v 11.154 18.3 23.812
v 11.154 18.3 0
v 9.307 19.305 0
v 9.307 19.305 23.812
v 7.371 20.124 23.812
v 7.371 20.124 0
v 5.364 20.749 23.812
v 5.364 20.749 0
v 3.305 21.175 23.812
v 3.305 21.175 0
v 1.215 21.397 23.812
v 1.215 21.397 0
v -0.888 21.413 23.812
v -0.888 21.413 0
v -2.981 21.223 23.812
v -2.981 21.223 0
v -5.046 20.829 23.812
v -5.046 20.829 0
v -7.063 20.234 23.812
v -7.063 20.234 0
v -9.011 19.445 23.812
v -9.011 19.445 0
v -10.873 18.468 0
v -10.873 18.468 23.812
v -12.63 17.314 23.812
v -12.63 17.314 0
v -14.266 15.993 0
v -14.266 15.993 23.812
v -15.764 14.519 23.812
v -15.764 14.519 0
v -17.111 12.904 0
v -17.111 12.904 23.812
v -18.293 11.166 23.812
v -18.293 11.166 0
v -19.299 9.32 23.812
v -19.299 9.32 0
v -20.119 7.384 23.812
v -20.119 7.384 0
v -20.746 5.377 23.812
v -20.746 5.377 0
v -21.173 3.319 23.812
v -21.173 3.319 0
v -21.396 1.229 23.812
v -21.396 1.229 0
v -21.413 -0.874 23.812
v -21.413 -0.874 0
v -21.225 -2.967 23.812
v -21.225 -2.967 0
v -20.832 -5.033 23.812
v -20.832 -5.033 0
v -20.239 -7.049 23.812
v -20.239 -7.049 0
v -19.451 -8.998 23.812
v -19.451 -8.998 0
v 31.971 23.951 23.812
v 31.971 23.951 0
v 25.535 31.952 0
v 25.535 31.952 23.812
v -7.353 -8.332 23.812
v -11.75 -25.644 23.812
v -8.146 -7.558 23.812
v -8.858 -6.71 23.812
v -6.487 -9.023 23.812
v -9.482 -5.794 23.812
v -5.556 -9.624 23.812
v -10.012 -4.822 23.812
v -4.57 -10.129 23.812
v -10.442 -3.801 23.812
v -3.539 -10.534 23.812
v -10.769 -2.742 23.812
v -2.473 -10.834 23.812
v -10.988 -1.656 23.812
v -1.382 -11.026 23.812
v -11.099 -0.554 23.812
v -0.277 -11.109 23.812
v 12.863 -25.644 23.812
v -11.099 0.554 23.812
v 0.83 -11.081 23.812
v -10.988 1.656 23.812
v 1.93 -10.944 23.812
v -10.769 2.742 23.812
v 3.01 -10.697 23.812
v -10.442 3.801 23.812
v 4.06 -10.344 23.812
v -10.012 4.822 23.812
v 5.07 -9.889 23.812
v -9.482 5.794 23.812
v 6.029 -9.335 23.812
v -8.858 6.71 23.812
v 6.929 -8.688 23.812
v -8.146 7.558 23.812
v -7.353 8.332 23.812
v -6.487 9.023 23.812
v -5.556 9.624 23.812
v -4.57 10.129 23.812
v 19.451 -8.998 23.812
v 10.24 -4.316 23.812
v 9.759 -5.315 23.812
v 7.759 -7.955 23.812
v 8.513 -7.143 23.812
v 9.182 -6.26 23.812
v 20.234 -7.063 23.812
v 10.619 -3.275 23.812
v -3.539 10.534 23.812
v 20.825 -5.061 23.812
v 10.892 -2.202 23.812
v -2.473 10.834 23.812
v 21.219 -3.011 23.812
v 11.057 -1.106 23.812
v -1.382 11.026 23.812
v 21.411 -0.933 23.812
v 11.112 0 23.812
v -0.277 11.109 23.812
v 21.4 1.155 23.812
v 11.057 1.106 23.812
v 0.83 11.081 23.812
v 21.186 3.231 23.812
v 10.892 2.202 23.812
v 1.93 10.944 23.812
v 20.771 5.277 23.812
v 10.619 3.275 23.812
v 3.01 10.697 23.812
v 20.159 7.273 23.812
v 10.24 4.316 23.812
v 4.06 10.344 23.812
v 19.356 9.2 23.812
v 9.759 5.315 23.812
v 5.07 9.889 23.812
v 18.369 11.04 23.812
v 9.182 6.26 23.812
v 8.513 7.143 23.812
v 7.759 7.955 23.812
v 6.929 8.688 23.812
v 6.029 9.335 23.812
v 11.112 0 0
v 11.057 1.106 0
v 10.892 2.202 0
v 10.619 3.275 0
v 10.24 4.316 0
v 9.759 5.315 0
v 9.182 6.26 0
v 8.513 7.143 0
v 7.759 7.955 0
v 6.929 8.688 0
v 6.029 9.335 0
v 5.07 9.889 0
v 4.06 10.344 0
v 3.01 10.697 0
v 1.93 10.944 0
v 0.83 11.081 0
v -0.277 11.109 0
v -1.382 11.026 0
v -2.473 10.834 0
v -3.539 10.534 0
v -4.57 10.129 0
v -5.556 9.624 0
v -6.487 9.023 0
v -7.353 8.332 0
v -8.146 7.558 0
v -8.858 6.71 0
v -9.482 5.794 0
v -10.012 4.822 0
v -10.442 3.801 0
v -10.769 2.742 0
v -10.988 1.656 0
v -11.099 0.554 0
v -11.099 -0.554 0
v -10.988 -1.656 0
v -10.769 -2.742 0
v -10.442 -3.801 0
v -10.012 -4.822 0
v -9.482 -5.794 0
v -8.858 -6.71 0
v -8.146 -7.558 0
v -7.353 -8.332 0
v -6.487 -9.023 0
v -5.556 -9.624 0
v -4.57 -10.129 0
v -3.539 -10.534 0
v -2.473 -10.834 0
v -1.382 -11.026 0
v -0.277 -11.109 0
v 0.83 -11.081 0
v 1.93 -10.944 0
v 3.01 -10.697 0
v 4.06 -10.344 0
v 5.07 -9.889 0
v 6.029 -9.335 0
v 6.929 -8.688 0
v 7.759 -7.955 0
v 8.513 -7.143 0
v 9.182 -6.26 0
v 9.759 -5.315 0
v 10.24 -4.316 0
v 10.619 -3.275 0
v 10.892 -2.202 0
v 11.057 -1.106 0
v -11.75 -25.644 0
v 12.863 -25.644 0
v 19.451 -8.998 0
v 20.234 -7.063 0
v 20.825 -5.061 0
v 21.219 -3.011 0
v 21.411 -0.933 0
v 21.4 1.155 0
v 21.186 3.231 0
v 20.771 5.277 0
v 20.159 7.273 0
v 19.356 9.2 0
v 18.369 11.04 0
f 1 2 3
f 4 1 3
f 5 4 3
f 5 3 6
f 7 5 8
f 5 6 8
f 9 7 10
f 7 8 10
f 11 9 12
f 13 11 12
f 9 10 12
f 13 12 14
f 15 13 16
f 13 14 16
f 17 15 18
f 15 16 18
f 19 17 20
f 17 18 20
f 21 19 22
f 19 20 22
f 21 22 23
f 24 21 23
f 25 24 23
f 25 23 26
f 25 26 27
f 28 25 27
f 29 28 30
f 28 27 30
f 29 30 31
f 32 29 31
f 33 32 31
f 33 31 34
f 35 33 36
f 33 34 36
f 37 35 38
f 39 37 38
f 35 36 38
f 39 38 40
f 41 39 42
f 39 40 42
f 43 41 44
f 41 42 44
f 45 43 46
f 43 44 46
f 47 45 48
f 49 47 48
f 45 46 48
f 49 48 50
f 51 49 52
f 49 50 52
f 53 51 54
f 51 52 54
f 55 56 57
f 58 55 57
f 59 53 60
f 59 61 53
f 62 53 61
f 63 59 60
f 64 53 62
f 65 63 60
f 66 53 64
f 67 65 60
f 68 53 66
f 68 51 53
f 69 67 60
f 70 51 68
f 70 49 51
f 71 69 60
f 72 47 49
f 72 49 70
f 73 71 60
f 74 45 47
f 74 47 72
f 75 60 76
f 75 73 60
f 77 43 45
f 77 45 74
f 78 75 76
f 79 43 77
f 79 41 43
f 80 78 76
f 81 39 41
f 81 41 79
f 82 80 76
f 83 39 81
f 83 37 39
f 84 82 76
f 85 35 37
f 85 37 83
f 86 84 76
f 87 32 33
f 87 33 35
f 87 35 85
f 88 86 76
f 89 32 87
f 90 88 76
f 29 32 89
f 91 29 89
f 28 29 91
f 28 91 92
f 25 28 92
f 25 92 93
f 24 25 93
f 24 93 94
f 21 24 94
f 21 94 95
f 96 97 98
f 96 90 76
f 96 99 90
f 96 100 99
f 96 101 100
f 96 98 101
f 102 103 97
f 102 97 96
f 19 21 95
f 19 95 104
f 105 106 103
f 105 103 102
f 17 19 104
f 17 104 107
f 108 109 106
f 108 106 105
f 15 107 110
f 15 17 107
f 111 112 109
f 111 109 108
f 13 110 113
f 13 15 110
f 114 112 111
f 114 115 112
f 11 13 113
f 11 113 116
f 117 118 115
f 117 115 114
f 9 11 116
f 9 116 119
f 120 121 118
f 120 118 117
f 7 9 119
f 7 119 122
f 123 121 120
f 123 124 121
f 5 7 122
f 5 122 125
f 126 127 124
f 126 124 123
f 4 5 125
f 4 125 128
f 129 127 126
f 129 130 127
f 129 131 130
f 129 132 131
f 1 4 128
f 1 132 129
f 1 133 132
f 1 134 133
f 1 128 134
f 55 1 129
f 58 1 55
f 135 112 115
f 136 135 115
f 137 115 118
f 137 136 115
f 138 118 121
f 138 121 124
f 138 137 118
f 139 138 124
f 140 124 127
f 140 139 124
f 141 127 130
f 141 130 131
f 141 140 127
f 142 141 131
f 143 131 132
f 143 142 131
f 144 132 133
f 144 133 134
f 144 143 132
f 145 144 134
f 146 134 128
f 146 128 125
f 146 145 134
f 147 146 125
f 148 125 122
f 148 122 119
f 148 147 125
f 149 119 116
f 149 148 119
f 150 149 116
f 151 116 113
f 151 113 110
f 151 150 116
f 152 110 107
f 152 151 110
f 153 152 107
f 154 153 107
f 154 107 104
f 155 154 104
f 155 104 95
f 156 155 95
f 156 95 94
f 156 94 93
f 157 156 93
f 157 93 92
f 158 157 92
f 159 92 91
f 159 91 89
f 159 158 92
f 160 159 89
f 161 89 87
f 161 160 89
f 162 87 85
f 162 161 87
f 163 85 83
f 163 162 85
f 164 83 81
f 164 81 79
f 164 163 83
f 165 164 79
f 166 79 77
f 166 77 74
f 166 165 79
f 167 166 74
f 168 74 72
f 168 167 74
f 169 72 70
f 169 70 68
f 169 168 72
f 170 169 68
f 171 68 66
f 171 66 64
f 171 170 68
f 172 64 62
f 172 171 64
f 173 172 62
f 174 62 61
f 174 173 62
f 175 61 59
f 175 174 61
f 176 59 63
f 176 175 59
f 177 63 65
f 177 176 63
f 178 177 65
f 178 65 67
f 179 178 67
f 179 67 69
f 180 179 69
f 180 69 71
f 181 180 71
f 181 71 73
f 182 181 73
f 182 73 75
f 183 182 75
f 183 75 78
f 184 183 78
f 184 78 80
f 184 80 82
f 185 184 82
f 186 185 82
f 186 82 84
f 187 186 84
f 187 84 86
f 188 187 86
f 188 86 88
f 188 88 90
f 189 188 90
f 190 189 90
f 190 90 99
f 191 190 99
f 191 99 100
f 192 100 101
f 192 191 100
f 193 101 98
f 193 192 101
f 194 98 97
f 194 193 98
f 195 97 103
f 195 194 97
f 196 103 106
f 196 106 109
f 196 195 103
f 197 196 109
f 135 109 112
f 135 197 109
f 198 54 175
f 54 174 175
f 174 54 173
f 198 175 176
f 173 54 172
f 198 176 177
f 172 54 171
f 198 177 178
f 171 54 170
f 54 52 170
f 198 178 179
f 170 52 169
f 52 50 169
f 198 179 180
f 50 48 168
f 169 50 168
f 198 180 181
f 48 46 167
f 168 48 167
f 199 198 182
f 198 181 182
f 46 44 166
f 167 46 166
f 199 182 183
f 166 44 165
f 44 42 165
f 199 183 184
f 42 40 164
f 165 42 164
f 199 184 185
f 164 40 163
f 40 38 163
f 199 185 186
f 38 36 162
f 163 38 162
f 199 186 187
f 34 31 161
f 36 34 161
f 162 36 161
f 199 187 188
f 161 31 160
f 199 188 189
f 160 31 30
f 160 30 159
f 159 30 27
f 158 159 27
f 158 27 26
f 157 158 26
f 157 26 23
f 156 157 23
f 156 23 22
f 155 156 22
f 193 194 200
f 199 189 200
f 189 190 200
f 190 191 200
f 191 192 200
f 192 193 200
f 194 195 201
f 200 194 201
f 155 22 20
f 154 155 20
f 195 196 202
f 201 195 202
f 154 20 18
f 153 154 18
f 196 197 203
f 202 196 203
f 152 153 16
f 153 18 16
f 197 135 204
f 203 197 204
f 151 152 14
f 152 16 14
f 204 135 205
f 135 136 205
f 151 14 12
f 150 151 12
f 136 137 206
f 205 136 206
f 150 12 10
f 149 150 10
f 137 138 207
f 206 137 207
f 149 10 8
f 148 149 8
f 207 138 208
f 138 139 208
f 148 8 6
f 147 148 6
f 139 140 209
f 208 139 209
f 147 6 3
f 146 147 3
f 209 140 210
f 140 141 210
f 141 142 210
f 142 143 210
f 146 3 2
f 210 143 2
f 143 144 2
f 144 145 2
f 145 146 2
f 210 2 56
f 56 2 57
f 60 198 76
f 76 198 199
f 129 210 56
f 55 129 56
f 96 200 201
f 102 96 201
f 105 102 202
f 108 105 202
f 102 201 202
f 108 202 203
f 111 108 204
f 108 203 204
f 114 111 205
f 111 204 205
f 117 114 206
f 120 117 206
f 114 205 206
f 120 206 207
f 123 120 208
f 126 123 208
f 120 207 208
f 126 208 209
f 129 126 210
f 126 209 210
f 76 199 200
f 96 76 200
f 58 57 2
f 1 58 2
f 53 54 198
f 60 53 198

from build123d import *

# Parameters (mm, degrees)
SKETCH1_R           = 11.1125
BOSS_EXTRUDE1_DEPTH = 23.8125


with BuildPart() as part:
    # Sketch1 → Boss-Extrude1 (new body)
    with BuildSketch(Plane.XY):
        with BuildLine():
            Line((-19.45060256, -8.998474127), (-11.749724448, -25.644265115))
            Line((-11.749724448, -25.644265115), (12.863242985, -25.644265115))
            Line((12.863242985, -25.644265115), (19.45060256, -8.998474127))
            ThreePointArc((19.45060256, -8.998474127), (21.400108774, 1.154911696), (18.369201048, 11.039516721))
            Line((18.369201048, 11.039516721), (31.970540917, 23.950858732))
            Line((31.970540917, 23.950858732), (25.535140583, 31.951663088))
            Line((25.535140583, 31.951663088), (11.153892049, 18.299977287))
            ThreePointArc((11.153892049, 18.299977287), (-14.265700604, 15.993381845), (-19.45060256, -8.998474127))
        make_face()
        Circle(SKETCH1_R, mode=Mode.SUBTRACT)
    extrude(amount=BOSS_EXTRUDE1_DEPTH)


solid = part.part
